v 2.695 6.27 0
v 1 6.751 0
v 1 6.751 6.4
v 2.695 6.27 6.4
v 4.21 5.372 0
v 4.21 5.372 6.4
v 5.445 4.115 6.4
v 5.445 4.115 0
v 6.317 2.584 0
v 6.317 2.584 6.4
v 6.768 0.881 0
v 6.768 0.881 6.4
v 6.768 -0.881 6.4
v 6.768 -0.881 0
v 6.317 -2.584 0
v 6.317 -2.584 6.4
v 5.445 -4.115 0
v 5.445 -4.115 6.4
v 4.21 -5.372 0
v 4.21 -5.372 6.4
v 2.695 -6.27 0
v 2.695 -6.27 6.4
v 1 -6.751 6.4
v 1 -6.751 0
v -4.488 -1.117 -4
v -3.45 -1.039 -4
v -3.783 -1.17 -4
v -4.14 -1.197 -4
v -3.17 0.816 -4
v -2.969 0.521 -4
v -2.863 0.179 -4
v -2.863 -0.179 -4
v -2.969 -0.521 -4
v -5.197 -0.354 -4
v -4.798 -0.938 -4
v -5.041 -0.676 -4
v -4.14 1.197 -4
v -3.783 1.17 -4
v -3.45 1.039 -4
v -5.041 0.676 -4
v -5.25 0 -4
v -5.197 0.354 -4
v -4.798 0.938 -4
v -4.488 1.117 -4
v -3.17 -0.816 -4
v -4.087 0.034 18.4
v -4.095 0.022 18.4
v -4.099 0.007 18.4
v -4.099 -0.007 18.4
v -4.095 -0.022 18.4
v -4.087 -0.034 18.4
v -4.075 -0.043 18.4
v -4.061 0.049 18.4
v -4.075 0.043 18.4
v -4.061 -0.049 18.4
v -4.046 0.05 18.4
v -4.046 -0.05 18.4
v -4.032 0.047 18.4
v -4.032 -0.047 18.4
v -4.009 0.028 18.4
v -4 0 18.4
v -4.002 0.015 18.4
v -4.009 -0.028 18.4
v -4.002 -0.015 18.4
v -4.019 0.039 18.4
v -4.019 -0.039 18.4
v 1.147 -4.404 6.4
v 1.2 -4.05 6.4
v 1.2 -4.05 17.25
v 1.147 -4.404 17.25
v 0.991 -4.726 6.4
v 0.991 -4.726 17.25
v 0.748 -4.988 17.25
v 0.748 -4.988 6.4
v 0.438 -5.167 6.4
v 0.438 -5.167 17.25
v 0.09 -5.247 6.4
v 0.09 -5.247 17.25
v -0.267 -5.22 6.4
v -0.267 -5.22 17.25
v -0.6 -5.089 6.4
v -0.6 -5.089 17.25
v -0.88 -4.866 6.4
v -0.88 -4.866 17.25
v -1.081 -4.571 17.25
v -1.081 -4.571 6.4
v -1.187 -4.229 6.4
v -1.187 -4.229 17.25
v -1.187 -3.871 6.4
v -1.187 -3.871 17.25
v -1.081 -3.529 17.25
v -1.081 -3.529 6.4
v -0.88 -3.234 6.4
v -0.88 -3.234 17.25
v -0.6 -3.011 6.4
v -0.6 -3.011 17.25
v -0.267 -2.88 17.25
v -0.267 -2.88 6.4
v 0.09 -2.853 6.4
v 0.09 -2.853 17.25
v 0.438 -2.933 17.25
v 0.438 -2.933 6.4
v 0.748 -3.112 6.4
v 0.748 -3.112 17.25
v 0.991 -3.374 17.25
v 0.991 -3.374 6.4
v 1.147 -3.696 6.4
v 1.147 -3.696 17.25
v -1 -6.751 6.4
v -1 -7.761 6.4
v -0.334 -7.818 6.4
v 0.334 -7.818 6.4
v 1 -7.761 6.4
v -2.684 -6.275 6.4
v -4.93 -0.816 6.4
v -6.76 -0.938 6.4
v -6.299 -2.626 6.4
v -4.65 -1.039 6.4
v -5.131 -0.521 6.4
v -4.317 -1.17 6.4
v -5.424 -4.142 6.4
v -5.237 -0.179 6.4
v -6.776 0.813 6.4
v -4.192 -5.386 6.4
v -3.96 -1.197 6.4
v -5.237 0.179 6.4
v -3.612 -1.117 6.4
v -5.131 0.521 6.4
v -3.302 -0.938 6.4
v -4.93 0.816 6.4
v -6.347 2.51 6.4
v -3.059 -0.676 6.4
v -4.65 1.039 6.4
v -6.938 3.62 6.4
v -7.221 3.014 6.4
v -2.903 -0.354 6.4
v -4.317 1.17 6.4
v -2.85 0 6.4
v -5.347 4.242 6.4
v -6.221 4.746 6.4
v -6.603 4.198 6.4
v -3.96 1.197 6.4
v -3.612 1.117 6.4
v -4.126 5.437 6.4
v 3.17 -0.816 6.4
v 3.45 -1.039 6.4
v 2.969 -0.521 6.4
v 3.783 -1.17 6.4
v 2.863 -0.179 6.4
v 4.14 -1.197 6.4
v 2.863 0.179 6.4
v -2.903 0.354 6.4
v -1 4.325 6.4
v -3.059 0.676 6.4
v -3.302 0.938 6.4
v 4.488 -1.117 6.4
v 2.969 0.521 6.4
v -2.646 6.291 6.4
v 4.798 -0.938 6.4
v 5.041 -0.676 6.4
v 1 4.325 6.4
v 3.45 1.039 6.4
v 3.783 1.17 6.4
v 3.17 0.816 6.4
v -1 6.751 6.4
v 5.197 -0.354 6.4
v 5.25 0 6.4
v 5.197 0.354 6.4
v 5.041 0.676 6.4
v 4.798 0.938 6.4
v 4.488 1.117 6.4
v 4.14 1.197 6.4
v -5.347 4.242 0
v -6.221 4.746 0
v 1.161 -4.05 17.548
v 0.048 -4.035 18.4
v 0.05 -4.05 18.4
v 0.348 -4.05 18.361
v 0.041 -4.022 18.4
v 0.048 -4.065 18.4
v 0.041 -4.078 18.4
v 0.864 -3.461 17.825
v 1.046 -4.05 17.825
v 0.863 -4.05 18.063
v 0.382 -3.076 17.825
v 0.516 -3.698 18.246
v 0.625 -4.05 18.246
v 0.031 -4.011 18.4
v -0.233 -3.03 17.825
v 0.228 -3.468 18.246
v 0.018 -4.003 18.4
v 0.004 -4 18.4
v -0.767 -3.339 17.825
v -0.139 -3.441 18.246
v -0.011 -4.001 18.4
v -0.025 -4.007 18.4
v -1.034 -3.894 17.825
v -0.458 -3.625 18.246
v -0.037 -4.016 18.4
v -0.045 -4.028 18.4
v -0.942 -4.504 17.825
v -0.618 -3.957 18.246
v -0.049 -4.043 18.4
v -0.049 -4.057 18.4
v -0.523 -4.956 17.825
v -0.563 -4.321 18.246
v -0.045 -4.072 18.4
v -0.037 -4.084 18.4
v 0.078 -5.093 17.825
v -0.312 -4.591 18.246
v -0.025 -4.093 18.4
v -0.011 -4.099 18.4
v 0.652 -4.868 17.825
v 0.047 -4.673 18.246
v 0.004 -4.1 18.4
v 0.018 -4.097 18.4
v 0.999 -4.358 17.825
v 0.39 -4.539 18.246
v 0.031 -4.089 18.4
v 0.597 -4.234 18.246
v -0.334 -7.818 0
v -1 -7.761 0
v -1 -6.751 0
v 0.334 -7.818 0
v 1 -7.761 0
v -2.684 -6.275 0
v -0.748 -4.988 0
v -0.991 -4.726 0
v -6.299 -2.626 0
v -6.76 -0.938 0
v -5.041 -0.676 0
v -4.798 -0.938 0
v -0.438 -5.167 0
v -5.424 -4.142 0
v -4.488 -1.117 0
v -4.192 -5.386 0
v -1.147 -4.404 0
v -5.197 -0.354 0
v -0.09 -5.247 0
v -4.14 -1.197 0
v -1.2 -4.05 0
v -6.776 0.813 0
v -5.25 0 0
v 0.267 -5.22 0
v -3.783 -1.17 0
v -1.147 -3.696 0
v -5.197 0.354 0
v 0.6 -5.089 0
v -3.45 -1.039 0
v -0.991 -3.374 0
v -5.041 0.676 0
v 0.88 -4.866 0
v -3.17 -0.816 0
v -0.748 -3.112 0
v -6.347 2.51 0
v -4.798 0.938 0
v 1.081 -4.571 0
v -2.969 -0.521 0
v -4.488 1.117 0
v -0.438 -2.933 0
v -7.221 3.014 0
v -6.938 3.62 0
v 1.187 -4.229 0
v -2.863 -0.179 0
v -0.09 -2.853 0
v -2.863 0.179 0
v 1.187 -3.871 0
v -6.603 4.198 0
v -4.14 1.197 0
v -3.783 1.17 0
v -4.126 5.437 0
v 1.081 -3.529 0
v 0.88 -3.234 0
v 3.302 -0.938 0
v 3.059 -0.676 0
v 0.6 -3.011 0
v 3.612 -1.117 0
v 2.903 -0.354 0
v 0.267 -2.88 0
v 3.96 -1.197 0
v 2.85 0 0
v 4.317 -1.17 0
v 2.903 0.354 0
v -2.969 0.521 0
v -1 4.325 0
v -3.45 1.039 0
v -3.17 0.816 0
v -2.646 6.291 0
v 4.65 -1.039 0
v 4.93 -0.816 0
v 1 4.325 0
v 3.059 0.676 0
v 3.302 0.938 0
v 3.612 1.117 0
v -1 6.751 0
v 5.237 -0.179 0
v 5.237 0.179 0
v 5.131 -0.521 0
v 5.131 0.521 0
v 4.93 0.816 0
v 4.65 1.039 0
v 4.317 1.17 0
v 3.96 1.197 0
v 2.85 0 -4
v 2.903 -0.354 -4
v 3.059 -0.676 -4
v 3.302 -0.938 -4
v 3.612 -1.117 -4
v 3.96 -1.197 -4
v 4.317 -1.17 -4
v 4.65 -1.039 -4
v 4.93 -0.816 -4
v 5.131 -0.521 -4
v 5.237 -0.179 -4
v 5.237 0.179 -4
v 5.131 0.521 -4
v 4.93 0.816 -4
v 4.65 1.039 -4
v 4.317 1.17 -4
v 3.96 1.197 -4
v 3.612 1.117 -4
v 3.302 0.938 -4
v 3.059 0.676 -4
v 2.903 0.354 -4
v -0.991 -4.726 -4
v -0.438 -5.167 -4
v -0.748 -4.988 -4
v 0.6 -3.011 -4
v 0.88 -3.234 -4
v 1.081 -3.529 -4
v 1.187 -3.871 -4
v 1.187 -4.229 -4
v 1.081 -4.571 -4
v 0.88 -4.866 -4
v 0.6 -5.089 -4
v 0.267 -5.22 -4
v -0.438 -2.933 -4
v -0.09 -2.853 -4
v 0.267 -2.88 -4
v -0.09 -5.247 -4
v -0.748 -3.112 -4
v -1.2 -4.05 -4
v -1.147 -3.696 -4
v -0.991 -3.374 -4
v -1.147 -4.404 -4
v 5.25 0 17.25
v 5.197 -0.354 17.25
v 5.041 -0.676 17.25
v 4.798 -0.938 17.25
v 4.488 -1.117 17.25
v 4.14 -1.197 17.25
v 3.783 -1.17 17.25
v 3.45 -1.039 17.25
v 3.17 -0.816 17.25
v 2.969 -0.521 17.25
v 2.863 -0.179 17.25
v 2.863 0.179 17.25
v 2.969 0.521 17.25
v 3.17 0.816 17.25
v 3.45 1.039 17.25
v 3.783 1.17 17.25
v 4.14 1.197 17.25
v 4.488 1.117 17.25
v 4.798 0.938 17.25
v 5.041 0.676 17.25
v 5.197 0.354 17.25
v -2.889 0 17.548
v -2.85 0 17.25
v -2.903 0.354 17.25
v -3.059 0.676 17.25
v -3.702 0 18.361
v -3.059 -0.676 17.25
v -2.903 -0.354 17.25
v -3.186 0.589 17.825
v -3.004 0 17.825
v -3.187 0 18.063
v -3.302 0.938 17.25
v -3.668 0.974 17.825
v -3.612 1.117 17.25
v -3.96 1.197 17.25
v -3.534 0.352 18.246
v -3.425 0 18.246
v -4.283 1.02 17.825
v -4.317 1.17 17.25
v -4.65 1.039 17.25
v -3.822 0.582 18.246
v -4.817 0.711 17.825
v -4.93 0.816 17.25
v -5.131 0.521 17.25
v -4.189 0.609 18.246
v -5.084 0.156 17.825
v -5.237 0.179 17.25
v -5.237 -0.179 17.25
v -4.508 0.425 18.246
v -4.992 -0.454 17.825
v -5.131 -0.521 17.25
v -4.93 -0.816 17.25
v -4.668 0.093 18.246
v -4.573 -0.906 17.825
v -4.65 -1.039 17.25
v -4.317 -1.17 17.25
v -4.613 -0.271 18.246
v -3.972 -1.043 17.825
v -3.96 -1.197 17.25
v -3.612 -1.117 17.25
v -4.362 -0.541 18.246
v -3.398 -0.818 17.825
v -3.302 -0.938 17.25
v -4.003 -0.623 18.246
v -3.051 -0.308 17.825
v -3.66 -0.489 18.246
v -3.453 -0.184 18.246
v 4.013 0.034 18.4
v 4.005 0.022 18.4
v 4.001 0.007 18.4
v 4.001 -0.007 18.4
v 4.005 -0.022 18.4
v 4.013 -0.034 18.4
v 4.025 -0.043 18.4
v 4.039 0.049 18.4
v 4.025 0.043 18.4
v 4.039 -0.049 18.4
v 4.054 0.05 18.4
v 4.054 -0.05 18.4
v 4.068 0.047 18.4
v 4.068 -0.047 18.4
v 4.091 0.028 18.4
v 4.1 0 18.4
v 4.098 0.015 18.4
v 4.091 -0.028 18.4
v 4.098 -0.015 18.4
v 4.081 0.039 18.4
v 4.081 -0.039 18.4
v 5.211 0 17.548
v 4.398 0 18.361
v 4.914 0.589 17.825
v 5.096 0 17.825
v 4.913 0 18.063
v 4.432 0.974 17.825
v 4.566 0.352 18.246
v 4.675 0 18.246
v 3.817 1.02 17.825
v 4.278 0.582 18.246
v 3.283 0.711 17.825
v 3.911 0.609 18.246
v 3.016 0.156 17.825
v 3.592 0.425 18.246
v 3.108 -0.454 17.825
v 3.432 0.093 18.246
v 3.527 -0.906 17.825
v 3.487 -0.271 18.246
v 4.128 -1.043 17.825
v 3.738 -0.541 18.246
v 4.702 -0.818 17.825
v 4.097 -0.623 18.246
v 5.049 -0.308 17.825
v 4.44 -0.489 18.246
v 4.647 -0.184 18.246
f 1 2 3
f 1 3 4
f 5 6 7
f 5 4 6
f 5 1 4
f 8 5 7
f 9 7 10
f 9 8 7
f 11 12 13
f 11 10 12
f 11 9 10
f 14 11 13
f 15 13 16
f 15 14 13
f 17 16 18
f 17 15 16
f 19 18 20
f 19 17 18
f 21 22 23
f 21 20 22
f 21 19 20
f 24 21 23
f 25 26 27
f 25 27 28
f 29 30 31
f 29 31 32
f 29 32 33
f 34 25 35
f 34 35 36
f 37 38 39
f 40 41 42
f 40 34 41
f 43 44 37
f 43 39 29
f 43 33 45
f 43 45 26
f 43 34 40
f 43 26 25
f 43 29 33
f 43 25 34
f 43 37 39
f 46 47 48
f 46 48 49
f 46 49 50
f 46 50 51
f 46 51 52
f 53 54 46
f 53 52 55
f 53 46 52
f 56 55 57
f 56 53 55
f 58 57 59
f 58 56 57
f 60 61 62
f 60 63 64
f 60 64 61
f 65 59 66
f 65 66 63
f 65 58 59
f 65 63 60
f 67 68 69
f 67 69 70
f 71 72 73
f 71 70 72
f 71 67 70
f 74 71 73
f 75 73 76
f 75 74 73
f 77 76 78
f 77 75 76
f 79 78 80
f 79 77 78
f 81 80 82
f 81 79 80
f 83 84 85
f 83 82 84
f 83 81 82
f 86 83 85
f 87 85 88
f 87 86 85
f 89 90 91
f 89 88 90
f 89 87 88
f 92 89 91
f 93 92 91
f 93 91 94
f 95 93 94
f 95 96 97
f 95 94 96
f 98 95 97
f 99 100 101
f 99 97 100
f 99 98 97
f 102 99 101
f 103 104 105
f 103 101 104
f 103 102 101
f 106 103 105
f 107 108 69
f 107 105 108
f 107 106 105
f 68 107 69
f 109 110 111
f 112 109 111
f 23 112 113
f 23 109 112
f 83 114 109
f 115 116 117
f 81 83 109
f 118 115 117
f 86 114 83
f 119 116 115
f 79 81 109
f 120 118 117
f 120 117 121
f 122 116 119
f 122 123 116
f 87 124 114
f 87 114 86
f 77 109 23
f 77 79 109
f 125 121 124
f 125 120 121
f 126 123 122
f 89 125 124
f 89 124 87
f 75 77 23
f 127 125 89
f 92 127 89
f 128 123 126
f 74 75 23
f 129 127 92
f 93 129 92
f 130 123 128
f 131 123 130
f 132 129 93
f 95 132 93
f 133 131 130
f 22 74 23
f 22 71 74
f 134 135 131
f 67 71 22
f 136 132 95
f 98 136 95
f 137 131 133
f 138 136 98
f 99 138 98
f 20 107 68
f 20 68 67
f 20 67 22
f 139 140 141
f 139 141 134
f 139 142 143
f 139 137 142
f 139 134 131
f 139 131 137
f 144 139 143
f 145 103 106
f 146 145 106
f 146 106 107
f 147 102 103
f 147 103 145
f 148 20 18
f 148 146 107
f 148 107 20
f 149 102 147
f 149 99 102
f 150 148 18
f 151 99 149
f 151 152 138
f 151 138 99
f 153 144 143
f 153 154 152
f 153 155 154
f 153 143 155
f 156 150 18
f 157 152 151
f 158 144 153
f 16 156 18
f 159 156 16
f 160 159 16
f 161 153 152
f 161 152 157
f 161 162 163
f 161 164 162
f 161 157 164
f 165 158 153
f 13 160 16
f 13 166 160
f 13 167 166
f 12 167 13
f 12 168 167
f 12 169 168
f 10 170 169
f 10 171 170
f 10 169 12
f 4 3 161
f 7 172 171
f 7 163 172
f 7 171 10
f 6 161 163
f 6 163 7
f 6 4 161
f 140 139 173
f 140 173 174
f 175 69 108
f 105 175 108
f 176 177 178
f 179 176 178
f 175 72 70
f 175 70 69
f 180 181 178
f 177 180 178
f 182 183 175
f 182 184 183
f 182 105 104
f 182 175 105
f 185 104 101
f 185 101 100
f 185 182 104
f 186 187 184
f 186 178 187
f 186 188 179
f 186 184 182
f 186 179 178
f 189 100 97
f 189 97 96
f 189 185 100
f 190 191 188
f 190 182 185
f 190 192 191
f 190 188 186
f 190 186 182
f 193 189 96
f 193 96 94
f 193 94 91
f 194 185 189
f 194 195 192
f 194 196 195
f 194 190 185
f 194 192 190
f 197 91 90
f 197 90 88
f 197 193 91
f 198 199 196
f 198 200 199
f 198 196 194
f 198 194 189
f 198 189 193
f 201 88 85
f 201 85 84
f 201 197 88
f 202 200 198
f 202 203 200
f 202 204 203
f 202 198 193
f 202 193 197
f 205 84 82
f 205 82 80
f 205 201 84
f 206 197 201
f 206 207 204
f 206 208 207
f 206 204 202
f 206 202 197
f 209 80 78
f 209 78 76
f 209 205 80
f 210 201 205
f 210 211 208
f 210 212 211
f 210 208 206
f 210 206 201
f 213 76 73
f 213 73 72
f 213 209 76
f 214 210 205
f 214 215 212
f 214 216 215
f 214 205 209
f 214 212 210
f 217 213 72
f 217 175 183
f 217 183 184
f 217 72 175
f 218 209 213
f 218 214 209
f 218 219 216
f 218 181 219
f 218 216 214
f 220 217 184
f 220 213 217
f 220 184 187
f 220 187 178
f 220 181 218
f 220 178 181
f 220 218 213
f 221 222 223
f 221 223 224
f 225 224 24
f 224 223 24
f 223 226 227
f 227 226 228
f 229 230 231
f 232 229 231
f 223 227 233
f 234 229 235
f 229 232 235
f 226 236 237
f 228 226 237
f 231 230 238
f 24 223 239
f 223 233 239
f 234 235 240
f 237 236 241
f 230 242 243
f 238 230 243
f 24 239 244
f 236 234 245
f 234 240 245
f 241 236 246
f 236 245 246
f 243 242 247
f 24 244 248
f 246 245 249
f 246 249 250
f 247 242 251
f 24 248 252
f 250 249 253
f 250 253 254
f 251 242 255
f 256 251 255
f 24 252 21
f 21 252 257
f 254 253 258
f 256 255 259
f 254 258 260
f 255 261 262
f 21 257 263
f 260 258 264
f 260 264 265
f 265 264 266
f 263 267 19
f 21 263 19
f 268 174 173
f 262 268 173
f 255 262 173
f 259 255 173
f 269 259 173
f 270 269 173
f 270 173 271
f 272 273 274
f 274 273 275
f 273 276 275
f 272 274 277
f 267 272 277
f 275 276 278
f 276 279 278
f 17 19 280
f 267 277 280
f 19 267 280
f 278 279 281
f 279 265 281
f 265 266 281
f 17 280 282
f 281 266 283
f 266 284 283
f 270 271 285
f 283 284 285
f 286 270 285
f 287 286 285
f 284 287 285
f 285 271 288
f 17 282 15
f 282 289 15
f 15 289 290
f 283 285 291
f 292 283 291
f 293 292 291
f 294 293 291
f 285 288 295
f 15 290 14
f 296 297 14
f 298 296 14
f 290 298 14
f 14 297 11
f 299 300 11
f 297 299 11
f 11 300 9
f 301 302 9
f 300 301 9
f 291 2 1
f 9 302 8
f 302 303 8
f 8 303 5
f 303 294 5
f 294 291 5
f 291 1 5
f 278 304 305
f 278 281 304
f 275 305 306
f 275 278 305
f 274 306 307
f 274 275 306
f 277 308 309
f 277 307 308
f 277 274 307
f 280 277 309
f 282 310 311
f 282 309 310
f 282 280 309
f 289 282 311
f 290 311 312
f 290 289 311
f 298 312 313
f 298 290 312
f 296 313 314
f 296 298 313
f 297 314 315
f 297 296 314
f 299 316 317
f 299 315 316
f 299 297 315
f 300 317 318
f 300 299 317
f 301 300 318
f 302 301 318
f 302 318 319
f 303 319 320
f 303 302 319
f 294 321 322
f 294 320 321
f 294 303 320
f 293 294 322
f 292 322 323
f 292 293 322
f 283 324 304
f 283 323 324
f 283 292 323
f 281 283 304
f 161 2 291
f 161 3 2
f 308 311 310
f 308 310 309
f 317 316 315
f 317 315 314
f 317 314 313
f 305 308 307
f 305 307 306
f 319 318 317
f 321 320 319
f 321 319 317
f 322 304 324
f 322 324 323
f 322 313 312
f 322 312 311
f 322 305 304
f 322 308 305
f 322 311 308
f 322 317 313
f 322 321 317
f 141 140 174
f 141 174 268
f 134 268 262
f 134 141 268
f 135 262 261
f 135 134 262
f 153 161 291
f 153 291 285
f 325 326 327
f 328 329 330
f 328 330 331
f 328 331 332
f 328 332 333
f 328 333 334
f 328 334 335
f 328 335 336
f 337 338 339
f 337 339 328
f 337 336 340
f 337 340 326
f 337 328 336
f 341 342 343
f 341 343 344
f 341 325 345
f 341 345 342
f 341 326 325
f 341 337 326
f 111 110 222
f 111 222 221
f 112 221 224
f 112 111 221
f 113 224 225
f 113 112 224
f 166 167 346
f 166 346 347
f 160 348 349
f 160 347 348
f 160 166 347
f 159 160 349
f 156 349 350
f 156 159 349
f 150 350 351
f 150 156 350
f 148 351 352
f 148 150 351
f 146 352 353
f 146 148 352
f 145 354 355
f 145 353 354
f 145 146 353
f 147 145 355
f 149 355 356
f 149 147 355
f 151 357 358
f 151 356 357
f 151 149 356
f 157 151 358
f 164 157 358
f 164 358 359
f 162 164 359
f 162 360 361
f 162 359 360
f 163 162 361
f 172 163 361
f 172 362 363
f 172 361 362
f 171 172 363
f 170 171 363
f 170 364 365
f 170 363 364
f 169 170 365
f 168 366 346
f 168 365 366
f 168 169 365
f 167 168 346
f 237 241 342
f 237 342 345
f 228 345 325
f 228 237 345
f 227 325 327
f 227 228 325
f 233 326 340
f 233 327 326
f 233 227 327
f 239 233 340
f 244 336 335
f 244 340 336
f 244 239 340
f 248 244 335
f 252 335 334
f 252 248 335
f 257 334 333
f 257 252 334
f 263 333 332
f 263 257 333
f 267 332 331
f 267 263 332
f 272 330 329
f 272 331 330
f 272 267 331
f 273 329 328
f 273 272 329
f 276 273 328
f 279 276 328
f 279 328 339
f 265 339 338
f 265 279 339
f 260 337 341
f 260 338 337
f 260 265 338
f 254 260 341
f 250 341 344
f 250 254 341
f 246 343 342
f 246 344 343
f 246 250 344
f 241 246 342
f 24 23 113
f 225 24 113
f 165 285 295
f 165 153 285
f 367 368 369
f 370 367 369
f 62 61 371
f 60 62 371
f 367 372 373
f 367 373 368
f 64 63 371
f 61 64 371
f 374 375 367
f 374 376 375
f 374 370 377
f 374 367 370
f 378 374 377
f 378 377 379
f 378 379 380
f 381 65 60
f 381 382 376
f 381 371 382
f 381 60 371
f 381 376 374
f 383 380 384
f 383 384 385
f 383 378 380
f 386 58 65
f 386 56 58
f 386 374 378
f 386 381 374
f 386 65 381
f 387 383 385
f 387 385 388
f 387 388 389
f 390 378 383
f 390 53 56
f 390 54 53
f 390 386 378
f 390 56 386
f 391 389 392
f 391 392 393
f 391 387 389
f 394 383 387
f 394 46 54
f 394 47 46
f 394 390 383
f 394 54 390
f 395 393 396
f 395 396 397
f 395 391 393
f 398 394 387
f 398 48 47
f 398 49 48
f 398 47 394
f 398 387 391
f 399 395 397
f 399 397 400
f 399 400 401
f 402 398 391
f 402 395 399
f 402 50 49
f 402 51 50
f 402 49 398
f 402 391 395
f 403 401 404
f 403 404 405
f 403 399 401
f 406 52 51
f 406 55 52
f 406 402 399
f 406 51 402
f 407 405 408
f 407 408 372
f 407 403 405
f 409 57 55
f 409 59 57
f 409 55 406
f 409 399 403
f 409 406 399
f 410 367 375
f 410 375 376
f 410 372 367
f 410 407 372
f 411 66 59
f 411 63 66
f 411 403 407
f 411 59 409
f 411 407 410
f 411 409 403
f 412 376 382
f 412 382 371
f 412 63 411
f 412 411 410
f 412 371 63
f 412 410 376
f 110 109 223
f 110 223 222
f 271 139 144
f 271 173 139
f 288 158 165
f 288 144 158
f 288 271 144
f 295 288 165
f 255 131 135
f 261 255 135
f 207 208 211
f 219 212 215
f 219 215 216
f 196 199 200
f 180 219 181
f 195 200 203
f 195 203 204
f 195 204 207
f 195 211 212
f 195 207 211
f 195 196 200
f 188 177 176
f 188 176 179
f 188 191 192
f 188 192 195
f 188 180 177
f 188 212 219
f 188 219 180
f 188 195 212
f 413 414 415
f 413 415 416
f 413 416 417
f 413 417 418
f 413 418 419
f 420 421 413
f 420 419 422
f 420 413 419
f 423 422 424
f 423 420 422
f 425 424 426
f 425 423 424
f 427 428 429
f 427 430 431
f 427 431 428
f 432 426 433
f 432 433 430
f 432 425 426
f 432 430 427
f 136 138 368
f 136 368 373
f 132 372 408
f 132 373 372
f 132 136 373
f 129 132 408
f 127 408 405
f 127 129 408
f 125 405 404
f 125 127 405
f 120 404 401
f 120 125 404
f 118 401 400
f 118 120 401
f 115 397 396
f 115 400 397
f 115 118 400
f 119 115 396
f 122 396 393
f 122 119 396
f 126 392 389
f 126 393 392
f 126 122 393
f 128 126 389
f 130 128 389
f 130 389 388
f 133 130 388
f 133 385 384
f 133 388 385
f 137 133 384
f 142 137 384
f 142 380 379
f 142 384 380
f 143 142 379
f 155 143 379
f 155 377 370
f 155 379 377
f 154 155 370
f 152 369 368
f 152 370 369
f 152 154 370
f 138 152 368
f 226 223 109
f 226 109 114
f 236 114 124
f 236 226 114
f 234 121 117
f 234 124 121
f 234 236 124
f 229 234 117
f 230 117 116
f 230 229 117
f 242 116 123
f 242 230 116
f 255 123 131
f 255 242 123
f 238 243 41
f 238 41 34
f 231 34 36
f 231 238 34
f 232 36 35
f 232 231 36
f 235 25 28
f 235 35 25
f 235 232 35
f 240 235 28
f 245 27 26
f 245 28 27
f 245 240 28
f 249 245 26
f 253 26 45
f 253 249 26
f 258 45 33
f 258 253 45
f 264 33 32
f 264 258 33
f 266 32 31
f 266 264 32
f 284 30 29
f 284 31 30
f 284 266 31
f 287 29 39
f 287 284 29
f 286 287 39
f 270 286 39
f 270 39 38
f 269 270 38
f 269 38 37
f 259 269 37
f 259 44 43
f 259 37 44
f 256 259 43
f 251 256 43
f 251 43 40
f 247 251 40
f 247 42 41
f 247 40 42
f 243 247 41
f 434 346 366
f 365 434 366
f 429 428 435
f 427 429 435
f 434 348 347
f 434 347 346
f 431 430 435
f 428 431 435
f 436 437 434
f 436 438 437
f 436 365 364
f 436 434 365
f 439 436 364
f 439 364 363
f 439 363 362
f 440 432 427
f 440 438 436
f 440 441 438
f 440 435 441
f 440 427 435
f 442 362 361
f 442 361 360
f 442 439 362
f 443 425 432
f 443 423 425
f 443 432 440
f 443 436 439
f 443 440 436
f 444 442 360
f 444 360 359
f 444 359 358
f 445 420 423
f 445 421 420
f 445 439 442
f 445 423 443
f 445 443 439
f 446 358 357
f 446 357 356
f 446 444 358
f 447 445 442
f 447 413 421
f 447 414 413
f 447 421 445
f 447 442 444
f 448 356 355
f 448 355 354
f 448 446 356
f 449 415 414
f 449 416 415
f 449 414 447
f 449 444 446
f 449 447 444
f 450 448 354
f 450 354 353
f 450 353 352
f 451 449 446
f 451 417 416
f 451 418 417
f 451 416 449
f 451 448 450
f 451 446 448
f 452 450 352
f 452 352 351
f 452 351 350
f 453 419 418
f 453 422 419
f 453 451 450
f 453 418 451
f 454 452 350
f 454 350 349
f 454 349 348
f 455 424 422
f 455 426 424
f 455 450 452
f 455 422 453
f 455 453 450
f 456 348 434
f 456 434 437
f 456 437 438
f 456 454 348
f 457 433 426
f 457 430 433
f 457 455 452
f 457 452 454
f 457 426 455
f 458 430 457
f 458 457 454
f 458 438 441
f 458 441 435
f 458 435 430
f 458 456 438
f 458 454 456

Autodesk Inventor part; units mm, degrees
ref_plane "YZ Plane" through (0, 0, 0) normal (1, 0, 0) x (0, 1, 0)
ref_plane "XZ Plane" through (0, 0, 0) normal (0, 1, 0) x (-1, 0, 0)
ref_plane "XY Plane" through (0, 0, 0) normal (0, 0, 1) x (1, 0, 0)
sketch "Sketch1" plane through (0, 0, 0) normal (0, 0, 1) x (1, 0, 0)
  circle A0 centre (0, 0) radius 6.825
  dimension "d0" = 13.65
extrude "Extrusion1" add sketch "Sketch1" along normal blind 6.4
sketch "Sketch2" plane through (0, 0, 6.4) normal (0, 0, 1) x (1, 0, 0)
  circle A0 centre (-4.05, 0) radius 1.2
  circle A1 centre (4.05, 0) radius 1.2
  circle A2 centre (0, -4.05) radius 1.2
  circle A3 centre (0, 0) radius 4.05 construction
  dimension "d3" = 2.4
  dimension "d4" = 2.4
  dimension "d5" = 2.4
  dimension "d6" = 8.1
extrude "Extrusion2" add sketch "Sketch2" along normal blind 12
fillet "Fillet1" radius 1.15 3 edges at (-5.25, 0, 18.4) (2.85, 0, 18.4) (-1.2, -4.05, 18.4)
sketch "Sketch3" plane through (0, 0, 0) normal (0, 0, -1) x (-1, 0, 0)
  circle A0 centre (-4.05, 0) radius 1.2 projected
  circle A1 centre (4.05, 0) radius 1.2 projected
  circle A2 centre (0, -4.05) radius 1.2 projected
  point P0 (0, 0)
extrude "Extrusion3" add sketch "Sketch3" along normal blind 4
sketch "Sketch4" plane through (0, 0, 6.4) normal (0, 0, 1) x (1, 0, 0)
  line L0 (-1, 6.825) -> (1, 6.825)
  line L1 (1, 6.825) -> (1, 4.325)
  line L2 (1, 4.325) -> (-1, 4.325)
  line L3 (-1, 4.325) -> (-1, 6.825)
  circle A0 centre (0, 0) radius 6.825 projected
  point P0 (0, 4.325)
  point P1 (0, 6.825)
  point P2 (1, 6.7513)
  point P3 (-1, 6.7513)
  dimension "d12" = 2
  dimension "d13" = 2.5
extrude "Extrusion4" cut sketch "Sketch4" against normal through all contours A0 L1 L2 L3 picked at (0, 5.1583)
sketch "Sketch5" plane through (0, 0, 6.4) normal (0, 0, 1) x (1, 0, 0)
  arc A0 (-1, 6.7513) -> (1, 6.7513) centre (0, 0) ccw projected
  arc A1 (-1.1465, 7.7406) -> (1.1465, 7.7406) centre (0, 0) ccw
  arc A2 (-1, 6.7513) -> (1, 6.7513) centre (0, 0) ccw projected
  line L0 (-1, -6.7513) -> (-1, -7.7608)
  line L1 (1, -6.7513) -> (1, -7.7608)
  dimension "d16" = 1
  dimension "d17" = 1
  dimension "d18" = 1
extrude "Extrusion5" add sketch "Sketch5" against normal up to surface (6.4 mm away)
pattern_circular "Circular Pattern1" count 2 over 120 about axis through (0, 0, 0) along (0, 0, -1) of "Extrusion5"
properties part number "NeutrikXLR" material "ABS Plastic"
